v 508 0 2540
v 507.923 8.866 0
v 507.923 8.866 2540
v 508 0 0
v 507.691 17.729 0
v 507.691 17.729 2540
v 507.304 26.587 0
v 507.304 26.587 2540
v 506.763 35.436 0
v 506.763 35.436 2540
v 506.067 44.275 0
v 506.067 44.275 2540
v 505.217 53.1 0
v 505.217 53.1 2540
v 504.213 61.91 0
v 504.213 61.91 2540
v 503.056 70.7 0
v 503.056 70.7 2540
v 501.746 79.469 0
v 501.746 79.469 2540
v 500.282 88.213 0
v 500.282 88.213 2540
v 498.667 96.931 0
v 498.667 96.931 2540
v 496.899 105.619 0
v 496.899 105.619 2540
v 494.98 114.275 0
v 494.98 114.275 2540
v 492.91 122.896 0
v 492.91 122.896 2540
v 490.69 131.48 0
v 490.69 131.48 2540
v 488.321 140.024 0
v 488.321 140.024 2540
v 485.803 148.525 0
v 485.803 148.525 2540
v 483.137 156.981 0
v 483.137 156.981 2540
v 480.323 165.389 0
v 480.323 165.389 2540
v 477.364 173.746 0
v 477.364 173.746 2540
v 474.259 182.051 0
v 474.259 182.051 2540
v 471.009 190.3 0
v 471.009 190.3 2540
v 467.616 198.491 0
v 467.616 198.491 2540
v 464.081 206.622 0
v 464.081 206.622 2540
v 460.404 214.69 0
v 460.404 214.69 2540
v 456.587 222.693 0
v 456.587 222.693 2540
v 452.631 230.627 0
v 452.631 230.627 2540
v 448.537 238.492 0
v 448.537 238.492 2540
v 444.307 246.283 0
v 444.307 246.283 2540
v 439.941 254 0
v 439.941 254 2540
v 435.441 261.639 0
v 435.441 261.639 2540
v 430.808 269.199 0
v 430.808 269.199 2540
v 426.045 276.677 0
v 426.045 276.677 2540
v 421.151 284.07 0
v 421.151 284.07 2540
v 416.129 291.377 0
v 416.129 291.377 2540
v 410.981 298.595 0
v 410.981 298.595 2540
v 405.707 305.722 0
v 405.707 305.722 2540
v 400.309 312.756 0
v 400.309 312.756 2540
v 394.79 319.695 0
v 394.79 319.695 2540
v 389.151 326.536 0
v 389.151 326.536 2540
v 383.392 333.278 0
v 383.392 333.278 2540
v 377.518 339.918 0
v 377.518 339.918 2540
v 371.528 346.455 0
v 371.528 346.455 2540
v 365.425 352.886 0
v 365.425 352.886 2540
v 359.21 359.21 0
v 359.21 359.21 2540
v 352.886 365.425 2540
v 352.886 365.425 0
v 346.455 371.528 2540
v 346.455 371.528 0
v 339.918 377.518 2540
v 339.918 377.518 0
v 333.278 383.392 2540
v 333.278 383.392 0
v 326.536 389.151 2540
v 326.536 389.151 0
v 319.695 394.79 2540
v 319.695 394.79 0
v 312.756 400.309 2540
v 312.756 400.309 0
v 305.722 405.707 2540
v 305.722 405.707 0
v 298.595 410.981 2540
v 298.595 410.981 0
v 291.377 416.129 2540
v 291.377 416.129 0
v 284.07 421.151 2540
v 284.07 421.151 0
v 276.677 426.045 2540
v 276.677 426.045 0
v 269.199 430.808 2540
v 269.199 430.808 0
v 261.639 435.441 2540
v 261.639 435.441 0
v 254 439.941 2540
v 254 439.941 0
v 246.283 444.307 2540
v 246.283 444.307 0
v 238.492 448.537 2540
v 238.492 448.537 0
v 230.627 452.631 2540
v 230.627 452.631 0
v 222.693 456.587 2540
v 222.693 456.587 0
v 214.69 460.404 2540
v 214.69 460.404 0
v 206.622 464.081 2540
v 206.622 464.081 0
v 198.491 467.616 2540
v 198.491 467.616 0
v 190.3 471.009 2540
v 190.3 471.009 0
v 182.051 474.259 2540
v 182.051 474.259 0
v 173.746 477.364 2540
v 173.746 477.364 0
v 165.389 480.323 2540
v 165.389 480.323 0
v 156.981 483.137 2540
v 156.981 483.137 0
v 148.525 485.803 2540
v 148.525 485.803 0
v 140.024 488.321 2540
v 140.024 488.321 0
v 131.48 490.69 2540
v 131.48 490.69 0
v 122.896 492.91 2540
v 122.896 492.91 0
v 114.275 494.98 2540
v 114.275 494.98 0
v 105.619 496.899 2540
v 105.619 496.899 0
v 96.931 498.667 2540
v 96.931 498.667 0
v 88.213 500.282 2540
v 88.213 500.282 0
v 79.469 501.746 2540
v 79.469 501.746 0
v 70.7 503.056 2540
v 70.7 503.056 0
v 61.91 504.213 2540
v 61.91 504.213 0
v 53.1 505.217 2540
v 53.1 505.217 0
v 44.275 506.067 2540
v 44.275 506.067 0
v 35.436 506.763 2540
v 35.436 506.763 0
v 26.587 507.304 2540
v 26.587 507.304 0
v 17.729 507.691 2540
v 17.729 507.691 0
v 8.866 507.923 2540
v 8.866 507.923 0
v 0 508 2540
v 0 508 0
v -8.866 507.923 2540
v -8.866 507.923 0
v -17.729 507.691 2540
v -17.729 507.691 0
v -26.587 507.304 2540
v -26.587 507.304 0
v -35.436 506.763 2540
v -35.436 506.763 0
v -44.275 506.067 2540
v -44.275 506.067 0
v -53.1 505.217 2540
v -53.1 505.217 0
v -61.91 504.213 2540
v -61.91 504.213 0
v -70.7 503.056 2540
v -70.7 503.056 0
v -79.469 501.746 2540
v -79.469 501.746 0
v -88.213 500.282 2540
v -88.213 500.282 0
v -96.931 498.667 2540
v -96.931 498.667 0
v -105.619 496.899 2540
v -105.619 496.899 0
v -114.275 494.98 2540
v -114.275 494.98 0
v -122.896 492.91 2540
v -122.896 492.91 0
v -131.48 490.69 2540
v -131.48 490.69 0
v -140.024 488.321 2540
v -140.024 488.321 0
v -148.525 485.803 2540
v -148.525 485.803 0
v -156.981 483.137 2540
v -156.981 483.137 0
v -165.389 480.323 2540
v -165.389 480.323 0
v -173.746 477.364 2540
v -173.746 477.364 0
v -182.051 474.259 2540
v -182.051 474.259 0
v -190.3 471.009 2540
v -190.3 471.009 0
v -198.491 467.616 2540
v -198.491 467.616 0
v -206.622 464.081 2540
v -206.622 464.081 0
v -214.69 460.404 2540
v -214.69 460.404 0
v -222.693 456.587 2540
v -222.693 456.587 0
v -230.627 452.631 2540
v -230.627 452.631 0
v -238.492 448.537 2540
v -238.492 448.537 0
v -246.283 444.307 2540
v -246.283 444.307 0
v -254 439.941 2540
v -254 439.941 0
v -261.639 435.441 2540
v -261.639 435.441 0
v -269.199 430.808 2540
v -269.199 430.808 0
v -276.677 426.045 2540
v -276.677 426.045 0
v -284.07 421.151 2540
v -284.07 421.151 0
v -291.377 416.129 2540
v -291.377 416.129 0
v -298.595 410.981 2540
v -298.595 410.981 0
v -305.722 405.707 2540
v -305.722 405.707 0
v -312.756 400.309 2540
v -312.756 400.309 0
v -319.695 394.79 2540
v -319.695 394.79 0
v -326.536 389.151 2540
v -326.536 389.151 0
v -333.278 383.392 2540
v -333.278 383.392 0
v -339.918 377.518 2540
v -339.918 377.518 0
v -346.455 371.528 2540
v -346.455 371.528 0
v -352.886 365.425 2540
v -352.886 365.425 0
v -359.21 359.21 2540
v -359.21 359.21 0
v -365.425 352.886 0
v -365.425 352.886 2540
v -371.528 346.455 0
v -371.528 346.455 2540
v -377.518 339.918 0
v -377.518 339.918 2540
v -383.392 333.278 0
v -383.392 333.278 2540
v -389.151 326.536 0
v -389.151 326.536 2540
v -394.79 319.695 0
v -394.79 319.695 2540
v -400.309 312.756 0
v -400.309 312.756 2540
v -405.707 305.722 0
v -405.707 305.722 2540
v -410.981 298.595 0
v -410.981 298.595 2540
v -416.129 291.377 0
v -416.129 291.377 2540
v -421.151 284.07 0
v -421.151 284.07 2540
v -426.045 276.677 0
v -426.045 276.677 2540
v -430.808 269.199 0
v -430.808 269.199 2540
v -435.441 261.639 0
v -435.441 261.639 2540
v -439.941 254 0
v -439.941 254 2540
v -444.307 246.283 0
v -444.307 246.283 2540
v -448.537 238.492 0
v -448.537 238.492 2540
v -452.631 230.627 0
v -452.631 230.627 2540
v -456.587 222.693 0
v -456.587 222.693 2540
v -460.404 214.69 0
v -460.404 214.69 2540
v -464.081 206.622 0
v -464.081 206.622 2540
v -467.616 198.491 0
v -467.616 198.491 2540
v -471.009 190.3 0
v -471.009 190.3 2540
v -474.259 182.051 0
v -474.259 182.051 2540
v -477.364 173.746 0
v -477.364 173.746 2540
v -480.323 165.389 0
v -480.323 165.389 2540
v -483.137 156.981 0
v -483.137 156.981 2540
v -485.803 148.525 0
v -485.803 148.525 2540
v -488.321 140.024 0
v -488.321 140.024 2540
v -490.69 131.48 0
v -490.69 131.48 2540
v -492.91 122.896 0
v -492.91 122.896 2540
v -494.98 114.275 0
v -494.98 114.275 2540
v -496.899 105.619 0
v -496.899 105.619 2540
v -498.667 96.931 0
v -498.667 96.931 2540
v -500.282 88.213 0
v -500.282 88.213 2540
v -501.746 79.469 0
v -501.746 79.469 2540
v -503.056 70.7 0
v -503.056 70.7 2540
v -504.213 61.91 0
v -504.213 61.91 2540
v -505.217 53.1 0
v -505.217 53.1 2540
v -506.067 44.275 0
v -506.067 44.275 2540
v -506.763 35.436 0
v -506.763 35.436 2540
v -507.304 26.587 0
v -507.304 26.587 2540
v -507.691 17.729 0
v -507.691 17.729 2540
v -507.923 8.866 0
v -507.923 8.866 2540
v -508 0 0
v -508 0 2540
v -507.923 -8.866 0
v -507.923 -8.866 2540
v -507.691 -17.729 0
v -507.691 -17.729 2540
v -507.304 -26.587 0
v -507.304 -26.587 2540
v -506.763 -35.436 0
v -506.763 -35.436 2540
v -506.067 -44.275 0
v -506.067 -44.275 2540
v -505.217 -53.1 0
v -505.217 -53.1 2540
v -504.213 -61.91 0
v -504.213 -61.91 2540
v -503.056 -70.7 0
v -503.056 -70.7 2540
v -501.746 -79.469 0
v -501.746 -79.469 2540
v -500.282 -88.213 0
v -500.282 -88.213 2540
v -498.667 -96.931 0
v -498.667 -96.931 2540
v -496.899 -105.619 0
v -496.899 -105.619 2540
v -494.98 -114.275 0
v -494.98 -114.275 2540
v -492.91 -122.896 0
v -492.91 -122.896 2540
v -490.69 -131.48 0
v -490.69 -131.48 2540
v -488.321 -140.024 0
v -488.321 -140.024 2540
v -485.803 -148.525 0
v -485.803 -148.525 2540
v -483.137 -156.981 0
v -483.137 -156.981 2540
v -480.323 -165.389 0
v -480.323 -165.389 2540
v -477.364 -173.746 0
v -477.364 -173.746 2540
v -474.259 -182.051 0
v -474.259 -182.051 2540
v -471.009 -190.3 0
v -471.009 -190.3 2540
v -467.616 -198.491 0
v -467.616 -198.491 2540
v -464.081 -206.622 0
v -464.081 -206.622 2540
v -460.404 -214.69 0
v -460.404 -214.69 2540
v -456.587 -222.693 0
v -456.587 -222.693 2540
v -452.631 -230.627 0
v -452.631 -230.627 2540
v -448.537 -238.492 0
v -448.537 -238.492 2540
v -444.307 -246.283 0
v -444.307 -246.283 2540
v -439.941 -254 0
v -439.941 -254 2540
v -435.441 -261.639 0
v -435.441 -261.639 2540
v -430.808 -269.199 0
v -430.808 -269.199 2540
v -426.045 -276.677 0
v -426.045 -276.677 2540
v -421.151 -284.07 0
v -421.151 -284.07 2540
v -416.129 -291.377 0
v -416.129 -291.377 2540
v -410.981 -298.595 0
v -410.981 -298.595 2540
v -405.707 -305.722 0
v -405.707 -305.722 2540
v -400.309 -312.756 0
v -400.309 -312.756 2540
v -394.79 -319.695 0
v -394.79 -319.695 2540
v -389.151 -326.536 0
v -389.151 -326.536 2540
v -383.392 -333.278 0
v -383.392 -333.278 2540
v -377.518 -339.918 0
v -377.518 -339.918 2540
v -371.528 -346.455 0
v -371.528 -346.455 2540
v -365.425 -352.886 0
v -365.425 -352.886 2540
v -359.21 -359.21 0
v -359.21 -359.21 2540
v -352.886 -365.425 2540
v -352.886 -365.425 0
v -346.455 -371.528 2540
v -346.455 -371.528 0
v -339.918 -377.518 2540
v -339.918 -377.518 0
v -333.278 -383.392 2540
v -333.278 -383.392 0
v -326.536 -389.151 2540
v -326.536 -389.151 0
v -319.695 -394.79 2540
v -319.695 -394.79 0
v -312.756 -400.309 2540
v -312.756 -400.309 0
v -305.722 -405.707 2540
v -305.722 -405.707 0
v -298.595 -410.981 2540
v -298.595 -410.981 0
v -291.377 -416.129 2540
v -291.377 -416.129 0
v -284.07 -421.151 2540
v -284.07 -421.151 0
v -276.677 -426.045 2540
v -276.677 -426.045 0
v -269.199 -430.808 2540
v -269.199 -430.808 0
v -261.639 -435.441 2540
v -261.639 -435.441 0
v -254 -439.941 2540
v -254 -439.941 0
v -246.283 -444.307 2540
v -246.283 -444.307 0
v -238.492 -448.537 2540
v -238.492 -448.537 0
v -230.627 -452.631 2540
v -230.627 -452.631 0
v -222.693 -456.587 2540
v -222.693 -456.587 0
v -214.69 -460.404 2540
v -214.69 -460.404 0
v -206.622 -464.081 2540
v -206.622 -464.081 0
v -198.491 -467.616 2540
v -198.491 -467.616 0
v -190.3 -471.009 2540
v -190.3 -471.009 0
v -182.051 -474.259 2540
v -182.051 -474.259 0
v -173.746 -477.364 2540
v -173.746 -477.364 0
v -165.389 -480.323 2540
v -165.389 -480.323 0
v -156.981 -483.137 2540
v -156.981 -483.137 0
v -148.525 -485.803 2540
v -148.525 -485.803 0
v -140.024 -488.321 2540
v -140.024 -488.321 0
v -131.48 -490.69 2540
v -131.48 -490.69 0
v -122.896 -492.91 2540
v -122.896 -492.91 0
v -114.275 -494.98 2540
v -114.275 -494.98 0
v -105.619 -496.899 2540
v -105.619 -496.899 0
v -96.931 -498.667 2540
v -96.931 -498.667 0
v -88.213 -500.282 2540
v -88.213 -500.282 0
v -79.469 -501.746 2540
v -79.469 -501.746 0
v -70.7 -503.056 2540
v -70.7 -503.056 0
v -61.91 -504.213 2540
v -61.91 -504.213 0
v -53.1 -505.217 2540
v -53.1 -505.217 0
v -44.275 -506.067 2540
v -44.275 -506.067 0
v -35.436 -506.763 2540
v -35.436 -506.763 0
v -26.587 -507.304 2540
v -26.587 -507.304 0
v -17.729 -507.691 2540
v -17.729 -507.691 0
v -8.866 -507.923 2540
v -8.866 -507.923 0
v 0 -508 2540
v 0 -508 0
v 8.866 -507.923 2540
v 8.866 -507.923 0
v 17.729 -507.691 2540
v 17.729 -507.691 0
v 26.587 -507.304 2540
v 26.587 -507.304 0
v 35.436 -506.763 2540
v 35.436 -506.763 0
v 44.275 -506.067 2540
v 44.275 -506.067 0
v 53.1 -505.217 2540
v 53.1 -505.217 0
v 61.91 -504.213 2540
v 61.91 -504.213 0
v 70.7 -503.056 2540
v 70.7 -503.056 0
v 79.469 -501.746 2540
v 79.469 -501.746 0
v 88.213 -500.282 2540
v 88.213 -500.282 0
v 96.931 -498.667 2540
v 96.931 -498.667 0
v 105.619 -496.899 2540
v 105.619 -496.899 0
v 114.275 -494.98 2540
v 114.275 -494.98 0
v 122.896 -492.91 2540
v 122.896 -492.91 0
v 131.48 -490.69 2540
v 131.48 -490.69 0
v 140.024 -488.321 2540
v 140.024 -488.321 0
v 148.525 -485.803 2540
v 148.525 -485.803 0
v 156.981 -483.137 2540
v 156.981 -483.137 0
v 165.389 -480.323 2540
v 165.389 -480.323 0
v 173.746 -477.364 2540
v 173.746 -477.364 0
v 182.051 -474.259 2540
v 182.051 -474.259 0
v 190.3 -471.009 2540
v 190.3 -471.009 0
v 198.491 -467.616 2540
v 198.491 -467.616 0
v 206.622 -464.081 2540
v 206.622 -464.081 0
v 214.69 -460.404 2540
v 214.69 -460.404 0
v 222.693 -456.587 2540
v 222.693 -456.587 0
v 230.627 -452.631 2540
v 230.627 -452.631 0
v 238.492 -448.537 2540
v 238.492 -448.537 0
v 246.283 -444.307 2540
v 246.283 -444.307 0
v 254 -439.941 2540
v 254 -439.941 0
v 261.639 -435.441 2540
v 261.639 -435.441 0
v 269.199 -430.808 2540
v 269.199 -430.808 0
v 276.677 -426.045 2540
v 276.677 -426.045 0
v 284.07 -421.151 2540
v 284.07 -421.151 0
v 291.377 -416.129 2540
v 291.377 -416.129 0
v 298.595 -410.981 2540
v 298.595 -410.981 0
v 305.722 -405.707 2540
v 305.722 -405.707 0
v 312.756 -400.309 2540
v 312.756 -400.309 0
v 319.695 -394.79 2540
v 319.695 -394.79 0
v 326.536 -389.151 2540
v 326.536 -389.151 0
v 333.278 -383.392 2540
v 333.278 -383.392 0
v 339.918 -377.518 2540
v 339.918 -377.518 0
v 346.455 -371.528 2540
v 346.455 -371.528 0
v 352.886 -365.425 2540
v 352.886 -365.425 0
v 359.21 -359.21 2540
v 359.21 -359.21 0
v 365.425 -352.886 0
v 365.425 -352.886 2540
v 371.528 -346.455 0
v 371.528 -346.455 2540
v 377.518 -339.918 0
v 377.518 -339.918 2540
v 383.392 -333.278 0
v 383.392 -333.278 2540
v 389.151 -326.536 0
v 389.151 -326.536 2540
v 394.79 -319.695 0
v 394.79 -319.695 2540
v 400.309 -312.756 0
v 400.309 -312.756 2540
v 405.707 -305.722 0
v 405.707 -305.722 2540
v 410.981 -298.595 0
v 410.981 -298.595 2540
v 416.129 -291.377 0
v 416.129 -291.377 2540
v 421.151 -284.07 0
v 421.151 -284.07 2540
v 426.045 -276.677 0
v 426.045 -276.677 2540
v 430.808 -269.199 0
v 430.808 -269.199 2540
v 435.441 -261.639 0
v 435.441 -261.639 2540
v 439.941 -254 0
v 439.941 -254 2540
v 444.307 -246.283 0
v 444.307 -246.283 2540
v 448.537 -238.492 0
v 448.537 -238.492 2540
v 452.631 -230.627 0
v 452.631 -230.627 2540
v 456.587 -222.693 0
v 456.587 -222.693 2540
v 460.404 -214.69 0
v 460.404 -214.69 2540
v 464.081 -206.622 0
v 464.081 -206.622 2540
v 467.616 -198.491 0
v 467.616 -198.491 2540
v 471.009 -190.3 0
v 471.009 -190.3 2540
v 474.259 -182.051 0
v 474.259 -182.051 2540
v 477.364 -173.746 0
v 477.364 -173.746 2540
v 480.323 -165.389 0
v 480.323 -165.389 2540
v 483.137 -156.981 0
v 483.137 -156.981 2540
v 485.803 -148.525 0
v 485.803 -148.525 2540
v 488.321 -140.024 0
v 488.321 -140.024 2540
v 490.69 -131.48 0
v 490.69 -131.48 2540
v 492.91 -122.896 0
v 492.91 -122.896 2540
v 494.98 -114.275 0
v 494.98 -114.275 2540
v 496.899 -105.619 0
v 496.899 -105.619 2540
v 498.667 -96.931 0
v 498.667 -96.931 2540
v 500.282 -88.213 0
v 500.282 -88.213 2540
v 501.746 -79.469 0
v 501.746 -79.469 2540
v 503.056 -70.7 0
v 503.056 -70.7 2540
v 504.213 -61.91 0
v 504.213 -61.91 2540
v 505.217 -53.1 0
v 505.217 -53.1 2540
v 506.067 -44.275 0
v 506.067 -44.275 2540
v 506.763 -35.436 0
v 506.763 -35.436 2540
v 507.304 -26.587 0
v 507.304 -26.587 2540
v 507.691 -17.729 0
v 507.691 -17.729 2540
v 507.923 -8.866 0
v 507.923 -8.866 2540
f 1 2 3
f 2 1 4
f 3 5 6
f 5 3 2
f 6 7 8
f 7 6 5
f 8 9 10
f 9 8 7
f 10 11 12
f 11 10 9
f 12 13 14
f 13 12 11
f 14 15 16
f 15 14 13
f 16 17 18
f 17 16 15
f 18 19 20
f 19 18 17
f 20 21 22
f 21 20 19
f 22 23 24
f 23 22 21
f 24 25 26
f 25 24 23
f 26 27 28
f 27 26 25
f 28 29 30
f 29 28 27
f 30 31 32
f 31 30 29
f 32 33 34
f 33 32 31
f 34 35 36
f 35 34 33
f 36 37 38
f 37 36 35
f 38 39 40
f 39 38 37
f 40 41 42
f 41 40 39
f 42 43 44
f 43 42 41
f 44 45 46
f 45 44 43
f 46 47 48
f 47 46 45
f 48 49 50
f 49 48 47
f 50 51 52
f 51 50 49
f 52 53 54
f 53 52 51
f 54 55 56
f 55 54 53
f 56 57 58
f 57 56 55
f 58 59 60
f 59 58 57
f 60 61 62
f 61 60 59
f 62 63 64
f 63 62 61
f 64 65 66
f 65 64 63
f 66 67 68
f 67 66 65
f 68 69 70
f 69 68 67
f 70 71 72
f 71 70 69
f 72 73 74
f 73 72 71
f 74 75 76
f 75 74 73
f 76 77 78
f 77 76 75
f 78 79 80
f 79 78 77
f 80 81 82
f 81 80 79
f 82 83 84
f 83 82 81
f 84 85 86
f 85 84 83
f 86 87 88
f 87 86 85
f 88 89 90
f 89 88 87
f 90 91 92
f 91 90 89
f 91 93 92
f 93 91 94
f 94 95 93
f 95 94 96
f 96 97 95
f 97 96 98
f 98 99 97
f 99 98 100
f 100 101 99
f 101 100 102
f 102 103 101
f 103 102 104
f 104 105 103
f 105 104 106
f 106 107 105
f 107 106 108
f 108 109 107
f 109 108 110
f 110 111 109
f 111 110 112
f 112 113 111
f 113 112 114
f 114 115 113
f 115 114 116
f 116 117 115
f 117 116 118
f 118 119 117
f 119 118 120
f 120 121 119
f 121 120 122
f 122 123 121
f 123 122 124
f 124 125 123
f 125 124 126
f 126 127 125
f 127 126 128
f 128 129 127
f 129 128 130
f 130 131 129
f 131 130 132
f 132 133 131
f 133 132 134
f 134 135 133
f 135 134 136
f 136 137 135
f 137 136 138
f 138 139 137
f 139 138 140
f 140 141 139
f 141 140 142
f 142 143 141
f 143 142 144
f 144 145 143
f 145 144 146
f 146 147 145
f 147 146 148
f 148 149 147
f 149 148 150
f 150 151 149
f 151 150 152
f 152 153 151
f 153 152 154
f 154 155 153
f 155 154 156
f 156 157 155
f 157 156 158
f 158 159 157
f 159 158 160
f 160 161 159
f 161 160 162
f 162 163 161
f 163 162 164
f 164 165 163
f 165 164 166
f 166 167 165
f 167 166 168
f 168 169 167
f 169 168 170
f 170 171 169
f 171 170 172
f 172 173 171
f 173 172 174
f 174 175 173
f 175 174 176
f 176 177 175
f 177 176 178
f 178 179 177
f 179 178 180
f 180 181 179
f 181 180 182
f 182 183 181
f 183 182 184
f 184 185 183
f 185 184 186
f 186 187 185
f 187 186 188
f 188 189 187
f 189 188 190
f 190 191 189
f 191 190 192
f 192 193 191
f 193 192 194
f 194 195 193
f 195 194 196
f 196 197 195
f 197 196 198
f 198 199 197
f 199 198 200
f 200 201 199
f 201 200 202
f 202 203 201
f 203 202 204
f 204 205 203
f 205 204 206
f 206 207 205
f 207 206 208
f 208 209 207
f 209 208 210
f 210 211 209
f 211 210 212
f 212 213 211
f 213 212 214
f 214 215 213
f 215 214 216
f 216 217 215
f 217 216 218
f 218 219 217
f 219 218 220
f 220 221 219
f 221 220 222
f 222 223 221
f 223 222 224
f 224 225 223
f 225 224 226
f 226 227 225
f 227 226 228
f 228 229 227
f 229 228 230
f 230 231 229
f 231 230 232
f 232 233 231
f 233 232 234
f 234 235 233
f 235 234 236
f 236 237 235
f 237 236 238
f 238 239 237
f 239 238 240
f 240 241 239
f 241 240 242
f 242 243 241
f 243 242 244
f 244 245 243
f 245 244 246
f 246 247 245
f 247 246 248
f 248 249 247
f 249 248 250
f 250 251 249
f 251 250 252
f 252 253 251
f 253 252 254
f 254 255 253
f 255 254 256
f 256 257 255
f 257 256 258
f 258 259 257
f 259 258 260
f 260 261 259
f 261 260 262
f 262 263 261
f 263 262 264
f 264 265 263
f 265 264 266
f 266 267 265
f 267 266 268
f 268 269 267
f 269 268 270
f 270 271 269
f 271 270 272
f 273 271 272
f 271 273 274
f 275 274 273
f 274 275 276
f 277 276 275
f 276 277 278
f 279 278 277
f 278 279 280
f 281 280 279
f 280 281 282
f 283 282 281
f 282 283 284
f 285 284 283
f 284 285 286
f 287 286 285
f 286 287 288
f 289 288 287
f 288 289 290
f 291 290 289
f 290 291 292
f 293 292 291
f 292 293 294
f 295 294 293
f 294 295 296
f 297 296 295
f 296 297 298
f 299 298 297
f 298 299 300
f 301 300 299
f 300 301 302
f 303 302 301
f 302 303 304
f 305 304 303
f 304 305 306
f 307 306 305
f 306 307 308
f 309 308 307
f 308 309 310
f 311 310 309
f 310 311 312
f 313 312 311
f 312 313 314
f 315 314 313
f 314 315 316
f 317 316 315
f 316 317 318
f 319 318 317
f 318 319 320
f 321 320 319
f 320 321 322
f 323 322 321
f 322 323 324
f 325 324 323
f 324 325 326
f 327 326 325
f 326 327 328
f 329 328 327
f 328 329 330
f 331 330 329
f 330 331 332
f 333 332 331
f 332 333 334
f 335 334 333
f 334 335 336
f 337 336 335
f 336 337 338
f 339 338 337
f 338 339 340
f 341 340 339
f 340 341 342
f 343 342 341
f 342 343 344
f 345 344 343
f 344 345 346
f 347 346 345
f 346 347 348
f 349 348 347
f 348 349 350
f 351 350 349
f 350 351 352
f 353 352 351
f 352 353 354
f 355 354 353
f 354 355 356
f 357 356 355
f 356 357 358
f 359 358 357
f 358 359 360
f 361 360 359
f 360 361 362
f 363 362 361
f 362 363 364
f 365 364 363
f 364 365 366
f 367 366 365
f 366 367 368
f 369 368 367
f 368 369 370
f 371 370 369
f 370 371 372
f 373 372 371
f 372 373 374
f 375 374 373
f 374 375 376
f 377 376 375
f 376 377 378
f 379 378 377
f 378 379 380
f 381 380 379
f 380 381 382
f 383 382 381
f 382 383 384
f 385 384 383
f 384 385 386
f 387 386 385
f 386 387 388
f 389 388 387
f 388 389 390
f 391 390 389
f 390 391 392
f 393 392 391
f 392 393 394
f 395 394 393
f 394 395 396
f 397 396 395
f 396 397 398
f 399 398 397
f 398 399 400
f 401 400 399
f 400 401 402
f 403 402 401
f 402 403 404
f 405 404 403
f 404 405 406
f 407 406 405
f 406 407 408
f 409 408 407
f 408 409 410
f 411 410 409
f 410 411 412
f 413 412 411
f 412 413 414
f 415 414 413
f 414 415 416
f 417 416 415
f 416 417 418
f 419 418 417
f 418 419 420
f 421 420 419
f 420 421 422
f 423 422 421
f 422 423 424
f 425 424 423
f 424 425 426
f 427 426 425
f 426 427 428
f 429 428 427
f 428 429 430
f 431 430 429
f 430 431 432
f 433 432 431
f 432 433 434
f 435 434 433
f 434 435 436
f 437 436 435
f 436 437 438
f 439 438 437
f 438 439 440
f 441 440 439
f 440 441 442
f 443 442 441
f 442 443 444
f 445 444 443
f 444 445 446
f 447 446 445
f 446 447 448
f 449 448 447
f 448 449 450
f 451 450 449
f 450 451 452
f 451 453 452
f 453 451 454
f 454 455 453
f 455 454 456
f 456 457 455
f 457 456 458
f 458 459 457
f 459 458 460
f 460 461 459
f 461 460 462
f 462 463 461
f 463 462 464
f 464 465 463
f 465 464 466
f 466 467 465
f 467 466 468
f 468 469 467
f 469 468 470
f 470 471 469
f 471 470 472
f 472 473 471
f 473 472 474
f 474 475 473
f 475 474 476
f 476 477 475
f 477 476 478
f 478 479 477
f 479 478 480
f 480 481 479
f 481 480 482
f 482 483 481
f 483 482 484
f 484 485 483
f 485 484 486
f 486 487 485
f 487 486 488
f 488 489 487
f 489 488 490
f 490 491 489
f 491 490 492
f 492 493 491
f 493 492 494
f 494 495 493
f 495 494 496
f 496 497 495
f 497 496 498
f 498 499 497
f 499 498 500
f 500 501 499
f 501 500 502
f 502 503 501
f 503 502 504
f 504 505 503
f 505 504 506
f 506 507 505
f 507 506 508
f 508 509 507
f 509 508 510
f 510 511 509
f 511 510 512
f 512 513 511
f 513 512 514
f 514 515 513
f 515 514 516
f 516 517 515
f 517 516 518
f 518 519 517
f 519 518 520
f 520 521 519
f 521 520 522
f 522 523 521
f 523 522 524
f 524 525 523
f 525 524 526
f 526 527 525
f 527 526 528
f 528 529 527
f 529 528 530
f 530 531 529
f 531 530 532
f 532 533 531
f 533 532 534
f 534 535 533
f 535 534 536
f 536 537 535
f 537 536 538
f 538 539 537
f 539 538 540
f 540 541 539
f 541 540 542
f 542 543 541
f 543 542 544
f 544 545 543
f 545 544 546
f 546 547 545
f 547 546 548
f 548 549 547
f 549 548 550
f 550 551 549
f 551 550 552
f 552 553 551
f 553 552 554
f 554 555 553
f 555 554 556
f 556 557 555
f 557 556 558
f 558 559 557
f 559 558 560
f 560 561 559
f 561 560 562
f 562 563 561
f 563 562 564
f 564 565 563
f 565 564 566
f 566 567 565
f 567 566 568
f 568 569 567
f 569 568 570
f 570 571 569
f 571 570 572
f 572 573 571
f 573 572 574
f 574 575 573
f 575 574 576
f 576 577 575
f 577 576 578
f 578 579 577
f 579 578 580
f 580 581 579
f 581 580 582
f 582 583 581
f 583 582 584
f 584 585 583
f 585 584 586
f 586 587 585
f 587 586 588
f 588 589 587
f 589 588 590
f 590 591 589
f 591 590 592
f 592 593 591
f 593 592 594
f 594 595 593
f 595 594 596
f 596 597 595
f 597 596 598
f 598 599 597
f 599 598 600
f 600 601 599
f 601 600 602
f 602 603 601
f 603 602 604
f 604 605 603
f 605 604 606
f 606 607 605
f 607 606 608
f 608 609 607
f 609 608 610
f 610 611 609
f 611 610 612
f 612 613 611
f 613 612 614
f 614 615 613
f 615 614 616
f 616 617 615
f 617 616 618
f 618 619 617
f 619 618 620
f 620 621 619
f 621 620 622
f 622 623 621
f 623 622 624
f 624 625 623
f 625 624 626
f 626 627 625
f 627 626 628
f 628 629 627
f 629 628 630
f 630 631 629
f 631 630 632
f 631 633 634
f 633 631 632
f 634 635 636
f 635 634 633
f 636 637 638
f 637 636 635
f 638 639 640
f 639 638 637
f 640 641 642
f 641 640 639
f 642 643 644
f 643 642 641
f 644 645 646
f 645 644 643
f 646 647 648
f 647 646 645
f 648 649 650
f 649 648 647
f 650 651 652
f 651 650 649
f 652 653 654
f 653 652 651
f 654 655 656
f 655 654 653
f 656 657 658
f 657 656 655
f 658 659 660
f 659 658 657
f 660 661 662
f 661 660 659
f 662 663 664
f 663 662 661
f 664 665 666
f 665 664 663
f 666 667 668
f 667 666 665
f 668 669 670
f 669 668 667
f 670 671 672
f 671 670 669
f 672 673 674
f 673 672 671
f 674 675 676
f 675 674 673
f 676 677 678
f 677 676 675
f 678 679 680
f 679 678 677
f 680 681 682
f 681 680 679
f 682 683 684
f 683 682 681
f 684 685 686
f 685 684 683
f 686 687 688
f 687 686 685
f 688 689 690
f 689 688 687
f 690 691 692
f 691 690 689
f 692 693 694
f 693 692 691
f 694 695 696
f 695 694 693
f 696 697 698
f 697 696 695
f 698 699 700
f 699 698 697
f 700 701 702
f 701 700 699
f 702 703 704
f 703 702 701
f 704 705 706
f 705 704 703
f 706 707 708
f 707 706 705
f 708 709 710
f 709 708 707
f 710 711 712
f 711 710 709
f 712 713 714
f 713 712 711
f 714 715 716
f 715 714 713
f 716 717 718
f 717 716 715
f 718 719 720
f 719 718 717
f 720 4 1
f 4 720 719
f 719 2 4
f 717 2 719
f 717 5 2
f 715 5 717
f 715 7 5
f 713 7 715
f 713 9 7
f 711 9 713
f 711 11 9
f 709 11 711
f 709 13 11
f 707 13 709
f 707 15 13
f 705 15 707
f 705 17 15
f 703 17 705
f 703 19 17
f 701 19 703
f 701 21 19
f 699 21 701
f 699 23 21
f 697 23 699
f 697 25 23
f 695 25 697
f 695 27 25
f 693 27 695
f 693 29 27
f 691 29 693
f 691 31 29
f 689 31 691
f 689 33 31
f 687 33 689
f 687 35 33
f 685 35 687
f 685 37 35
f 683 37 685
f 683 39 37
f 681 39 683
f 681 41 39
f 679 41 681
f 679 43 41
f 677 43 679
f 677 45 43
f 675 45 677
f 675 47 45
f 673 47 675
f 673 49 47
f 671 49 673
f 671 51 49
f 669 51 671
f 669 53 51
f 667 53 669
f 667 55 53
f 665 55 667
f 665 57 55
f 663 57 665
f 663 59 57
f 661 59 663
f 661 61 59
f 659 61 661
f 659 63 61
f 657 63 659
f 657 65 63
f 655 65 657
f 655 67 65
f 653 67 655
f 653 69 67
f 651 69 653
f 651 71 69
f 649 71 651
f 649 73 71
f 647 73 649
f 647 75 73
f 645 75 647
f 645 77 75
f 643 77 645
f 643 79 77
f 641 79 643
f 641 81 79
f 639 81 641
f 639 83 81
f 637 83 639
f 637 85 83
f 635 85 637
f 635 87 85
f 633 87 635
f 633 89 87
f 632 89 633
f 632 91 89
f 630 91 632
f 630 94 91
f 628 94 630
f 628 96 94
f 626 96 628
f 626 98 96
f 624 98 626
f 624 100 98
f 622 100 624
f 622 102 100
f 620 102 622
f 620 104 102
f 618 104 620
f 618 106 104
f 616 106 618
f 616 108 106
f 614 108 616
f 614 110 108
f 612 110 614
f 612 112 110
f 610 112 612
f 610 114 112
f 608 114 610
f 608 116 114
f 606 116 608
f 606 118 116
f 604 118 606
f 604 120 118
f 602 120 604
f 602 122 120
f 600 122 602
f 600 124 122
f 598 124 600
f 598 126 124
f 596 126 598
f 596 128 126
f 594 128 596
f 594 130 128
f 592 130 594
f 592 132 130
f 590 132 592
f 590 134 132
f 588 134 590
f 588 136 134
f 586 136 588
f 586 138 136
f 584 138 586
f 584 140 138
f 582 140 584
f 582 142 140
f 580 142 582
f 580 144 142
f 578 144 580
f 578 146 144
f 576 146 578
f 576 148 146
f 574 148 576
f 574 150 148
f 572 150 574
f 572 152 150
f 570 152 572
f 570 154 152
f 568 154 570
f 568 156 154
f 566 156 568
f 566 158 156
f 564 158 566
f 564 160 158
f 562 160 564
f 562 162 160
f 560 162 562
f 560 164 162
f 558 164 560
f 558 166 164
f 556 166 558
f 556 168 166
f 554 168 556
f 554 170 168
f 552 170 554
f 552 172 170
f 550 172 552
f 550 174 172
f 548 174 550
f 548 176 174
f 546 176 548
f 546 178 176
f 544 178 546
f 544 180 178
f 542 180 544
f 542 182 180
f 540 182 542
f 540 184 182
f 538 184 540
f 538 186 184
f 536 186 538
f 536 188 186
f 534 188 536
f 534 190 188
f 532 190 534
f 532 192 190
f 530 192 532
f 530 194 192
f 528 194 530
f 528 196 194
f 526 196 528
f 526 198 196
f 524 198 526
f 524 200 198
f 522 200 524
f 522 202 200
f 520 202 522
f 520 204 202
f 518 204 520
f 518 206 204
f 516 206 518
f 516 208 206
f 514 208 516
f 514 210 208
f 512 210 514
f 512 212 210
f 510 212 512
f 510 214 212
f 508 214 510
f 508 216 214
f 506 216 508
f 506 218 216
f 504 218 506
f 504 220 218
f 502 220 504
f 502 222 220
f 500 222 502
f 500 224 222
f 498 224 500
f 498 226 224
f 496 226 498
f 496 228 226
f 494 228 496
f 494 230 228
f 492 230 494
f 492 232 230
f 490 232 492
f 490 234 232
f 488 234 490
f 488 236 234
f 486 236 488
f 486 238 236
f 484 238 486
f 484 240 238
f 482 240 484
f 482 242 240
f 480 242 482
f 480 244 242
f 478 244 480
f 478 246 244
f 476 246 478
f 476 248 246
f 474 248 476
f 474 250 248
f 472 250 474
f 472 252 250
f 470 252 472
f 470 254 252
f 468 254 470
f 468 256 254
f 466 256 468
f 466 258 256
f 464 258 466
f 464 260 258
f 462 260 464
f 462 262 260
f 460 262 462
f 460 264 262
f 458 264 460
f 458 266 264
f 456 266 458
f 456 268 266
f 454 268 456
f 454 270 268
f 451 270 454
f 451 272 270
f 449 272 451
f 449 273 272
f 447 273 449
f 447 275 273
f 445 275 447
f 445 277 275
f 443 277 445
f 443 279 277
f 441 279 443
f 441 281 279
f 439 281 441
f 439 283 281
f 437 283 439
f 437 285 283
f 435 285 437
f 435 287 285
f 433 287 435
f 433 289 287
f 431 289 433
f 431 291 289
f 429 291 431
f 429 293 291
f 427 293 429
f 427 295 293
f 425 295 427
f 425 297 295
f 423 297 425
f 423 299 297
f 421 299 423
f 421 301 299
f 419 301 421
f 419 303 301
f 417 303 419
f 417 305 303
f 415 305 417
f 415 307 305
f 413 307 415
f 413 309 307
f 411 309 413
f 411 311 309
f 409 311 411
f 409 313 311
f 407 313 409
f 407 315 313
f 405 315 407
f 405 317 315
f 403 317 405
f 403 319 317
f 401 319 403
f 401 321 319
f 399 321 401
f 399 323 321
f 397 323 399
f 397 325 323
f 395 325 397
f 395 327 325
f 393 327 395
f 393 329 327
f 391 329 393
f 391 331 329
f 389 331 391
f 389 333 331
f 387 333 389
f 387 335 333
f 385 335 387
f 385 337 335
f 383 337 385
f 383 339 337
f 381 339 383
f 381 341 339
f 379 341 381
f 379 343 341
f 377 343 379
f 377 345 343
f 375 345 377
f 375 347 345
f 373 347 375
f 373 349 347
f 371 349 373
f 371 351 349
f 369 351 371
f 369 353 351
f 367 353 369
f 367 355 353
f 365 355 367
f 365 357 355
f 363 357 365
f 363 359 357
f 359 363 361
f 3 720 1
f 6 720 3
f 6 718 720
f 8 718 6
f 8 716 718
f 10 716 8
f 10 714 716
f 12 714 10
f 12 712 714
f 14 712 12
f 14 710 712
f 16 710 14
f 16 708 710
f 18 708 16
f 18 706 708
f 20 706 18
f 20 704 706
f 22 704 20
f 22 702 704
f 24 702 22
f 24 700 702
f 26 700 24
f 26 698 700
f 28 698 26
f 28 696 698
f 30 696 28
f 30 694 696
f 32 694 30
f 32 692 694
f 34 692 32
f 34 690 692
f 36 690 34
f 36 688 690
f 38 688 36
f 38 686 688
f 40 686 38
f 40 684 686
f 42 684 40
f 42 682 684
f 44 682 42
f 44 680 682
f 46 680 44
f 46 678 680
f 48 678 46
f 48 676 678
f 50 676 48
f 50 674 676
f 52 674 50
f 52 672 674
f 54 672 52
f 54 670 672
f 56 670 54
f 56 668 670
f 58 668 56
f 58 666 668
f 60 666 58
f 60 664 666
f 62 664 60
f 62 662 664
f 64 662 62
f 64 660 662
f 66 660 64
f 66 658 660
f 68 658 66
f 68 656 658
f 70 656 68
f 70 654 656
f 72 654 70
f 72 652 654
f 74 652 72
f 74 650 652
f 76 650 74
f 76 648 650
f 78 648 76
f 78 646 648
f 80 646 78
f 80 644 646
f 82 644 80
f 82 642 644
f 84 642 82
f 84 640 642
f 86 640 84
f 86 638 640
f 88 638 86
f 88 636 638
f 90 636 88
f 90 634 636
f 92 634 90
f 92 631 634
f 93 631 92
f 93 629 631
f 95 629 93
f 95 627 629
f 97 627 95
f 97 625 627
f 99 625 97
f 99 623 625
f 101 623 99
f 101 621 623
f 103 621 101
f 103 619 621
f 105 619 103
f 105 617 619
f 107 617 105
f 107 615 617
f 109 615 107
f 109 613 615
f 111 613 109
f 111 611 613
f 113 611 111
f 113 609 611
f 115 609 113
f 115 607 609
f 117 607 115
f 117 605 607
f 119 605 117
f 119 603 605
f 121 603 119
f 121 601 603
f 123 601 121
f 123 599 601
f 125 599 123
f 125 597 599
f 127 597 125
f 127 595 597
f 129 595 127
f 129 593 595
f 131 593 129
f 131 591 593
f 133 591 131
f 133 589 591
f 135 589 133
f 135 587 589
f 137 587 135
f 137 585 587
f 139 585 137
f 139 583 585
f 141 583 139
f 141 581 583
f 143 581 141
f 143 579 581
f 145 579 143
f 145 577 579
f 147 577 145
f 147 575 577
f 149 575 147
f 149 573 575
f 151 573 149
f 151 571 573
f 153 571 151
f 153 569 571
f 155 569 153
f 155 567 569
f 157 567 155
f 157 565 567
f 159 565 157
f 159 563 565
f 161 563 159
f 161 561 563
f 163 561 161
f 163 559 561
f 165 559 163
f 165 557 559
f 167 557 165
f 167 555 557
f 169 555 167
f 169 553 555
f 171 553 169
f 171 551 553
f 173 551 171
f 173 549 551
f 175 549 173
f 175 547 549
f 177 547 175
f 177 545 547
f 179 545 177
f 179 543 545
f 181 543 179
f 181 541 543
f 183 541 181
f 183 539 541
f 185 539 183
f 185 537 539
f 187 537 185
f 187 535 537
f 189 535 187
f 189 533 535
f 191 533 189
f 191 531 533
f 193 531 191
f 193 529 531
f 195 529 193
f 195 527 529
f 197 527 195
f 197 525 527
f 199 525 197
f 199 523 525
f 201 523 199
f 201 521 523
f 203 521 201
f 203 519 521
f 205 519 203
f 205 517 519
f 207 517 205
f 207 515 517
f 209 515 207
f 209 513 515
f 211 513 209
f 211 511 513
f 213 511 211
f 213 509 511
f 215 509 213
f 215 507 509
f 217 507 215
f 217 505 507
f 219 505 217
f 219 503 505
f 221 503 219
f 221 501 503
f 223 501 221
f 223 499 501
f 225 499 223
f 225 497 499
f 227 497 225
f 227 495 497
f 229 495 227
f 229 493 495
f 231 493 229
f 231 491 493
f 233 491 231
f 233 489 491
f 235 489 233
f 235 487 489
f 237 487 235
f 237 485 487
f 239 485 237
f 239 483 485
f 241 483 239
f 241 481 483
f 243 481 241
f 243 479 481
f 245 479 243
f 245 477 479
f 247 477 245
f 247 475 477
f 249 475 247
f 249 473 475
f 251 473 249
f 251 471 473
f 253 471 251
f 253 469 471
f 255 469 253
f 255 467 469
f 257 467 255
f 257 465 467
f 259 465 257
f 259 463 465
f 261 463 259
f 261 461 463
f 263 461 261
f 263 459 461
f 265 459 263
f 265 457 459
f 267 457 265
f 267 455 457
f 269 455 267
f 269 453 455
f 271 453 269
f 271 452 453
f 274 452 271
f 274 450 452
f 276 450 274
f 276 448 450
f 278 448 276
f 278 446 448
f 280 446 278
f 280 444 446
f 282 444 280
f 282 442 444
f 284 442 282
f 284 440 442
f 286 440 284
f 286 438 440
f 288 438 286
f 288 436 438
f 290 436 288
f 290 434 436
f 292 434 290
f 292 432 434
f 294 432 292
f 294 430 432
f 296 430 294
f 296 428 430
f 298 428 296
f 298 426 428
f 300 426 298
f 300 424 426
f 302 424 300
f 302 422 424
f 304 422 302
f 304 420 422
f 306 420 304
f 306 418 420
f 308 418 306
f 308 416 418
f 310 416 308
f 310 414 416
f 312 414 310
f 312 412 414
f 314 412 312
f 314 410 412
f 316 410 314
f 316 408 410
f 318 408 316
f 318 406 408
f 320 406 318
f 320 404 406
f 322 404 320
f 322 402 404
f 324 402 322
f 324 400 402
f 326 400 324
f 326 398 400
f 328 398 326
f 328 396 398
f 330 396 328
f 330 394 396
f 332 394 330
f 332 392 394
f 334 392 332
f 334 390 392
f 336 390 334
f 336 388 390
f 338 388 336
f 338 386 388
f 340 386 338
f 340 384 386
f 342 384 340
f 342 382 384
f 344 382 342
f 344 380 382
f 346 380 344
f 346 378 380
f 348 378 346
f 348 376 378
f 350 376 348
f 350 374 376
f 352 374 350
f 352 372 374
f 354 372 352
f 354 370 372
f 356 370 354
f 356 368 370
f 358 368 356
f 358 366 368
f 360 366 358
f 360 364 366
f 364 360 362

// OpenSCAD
// Unit of length: Unit.MM
cylinder(h = 2540.0, d = 1016.0, center = false, $fn = 360);
